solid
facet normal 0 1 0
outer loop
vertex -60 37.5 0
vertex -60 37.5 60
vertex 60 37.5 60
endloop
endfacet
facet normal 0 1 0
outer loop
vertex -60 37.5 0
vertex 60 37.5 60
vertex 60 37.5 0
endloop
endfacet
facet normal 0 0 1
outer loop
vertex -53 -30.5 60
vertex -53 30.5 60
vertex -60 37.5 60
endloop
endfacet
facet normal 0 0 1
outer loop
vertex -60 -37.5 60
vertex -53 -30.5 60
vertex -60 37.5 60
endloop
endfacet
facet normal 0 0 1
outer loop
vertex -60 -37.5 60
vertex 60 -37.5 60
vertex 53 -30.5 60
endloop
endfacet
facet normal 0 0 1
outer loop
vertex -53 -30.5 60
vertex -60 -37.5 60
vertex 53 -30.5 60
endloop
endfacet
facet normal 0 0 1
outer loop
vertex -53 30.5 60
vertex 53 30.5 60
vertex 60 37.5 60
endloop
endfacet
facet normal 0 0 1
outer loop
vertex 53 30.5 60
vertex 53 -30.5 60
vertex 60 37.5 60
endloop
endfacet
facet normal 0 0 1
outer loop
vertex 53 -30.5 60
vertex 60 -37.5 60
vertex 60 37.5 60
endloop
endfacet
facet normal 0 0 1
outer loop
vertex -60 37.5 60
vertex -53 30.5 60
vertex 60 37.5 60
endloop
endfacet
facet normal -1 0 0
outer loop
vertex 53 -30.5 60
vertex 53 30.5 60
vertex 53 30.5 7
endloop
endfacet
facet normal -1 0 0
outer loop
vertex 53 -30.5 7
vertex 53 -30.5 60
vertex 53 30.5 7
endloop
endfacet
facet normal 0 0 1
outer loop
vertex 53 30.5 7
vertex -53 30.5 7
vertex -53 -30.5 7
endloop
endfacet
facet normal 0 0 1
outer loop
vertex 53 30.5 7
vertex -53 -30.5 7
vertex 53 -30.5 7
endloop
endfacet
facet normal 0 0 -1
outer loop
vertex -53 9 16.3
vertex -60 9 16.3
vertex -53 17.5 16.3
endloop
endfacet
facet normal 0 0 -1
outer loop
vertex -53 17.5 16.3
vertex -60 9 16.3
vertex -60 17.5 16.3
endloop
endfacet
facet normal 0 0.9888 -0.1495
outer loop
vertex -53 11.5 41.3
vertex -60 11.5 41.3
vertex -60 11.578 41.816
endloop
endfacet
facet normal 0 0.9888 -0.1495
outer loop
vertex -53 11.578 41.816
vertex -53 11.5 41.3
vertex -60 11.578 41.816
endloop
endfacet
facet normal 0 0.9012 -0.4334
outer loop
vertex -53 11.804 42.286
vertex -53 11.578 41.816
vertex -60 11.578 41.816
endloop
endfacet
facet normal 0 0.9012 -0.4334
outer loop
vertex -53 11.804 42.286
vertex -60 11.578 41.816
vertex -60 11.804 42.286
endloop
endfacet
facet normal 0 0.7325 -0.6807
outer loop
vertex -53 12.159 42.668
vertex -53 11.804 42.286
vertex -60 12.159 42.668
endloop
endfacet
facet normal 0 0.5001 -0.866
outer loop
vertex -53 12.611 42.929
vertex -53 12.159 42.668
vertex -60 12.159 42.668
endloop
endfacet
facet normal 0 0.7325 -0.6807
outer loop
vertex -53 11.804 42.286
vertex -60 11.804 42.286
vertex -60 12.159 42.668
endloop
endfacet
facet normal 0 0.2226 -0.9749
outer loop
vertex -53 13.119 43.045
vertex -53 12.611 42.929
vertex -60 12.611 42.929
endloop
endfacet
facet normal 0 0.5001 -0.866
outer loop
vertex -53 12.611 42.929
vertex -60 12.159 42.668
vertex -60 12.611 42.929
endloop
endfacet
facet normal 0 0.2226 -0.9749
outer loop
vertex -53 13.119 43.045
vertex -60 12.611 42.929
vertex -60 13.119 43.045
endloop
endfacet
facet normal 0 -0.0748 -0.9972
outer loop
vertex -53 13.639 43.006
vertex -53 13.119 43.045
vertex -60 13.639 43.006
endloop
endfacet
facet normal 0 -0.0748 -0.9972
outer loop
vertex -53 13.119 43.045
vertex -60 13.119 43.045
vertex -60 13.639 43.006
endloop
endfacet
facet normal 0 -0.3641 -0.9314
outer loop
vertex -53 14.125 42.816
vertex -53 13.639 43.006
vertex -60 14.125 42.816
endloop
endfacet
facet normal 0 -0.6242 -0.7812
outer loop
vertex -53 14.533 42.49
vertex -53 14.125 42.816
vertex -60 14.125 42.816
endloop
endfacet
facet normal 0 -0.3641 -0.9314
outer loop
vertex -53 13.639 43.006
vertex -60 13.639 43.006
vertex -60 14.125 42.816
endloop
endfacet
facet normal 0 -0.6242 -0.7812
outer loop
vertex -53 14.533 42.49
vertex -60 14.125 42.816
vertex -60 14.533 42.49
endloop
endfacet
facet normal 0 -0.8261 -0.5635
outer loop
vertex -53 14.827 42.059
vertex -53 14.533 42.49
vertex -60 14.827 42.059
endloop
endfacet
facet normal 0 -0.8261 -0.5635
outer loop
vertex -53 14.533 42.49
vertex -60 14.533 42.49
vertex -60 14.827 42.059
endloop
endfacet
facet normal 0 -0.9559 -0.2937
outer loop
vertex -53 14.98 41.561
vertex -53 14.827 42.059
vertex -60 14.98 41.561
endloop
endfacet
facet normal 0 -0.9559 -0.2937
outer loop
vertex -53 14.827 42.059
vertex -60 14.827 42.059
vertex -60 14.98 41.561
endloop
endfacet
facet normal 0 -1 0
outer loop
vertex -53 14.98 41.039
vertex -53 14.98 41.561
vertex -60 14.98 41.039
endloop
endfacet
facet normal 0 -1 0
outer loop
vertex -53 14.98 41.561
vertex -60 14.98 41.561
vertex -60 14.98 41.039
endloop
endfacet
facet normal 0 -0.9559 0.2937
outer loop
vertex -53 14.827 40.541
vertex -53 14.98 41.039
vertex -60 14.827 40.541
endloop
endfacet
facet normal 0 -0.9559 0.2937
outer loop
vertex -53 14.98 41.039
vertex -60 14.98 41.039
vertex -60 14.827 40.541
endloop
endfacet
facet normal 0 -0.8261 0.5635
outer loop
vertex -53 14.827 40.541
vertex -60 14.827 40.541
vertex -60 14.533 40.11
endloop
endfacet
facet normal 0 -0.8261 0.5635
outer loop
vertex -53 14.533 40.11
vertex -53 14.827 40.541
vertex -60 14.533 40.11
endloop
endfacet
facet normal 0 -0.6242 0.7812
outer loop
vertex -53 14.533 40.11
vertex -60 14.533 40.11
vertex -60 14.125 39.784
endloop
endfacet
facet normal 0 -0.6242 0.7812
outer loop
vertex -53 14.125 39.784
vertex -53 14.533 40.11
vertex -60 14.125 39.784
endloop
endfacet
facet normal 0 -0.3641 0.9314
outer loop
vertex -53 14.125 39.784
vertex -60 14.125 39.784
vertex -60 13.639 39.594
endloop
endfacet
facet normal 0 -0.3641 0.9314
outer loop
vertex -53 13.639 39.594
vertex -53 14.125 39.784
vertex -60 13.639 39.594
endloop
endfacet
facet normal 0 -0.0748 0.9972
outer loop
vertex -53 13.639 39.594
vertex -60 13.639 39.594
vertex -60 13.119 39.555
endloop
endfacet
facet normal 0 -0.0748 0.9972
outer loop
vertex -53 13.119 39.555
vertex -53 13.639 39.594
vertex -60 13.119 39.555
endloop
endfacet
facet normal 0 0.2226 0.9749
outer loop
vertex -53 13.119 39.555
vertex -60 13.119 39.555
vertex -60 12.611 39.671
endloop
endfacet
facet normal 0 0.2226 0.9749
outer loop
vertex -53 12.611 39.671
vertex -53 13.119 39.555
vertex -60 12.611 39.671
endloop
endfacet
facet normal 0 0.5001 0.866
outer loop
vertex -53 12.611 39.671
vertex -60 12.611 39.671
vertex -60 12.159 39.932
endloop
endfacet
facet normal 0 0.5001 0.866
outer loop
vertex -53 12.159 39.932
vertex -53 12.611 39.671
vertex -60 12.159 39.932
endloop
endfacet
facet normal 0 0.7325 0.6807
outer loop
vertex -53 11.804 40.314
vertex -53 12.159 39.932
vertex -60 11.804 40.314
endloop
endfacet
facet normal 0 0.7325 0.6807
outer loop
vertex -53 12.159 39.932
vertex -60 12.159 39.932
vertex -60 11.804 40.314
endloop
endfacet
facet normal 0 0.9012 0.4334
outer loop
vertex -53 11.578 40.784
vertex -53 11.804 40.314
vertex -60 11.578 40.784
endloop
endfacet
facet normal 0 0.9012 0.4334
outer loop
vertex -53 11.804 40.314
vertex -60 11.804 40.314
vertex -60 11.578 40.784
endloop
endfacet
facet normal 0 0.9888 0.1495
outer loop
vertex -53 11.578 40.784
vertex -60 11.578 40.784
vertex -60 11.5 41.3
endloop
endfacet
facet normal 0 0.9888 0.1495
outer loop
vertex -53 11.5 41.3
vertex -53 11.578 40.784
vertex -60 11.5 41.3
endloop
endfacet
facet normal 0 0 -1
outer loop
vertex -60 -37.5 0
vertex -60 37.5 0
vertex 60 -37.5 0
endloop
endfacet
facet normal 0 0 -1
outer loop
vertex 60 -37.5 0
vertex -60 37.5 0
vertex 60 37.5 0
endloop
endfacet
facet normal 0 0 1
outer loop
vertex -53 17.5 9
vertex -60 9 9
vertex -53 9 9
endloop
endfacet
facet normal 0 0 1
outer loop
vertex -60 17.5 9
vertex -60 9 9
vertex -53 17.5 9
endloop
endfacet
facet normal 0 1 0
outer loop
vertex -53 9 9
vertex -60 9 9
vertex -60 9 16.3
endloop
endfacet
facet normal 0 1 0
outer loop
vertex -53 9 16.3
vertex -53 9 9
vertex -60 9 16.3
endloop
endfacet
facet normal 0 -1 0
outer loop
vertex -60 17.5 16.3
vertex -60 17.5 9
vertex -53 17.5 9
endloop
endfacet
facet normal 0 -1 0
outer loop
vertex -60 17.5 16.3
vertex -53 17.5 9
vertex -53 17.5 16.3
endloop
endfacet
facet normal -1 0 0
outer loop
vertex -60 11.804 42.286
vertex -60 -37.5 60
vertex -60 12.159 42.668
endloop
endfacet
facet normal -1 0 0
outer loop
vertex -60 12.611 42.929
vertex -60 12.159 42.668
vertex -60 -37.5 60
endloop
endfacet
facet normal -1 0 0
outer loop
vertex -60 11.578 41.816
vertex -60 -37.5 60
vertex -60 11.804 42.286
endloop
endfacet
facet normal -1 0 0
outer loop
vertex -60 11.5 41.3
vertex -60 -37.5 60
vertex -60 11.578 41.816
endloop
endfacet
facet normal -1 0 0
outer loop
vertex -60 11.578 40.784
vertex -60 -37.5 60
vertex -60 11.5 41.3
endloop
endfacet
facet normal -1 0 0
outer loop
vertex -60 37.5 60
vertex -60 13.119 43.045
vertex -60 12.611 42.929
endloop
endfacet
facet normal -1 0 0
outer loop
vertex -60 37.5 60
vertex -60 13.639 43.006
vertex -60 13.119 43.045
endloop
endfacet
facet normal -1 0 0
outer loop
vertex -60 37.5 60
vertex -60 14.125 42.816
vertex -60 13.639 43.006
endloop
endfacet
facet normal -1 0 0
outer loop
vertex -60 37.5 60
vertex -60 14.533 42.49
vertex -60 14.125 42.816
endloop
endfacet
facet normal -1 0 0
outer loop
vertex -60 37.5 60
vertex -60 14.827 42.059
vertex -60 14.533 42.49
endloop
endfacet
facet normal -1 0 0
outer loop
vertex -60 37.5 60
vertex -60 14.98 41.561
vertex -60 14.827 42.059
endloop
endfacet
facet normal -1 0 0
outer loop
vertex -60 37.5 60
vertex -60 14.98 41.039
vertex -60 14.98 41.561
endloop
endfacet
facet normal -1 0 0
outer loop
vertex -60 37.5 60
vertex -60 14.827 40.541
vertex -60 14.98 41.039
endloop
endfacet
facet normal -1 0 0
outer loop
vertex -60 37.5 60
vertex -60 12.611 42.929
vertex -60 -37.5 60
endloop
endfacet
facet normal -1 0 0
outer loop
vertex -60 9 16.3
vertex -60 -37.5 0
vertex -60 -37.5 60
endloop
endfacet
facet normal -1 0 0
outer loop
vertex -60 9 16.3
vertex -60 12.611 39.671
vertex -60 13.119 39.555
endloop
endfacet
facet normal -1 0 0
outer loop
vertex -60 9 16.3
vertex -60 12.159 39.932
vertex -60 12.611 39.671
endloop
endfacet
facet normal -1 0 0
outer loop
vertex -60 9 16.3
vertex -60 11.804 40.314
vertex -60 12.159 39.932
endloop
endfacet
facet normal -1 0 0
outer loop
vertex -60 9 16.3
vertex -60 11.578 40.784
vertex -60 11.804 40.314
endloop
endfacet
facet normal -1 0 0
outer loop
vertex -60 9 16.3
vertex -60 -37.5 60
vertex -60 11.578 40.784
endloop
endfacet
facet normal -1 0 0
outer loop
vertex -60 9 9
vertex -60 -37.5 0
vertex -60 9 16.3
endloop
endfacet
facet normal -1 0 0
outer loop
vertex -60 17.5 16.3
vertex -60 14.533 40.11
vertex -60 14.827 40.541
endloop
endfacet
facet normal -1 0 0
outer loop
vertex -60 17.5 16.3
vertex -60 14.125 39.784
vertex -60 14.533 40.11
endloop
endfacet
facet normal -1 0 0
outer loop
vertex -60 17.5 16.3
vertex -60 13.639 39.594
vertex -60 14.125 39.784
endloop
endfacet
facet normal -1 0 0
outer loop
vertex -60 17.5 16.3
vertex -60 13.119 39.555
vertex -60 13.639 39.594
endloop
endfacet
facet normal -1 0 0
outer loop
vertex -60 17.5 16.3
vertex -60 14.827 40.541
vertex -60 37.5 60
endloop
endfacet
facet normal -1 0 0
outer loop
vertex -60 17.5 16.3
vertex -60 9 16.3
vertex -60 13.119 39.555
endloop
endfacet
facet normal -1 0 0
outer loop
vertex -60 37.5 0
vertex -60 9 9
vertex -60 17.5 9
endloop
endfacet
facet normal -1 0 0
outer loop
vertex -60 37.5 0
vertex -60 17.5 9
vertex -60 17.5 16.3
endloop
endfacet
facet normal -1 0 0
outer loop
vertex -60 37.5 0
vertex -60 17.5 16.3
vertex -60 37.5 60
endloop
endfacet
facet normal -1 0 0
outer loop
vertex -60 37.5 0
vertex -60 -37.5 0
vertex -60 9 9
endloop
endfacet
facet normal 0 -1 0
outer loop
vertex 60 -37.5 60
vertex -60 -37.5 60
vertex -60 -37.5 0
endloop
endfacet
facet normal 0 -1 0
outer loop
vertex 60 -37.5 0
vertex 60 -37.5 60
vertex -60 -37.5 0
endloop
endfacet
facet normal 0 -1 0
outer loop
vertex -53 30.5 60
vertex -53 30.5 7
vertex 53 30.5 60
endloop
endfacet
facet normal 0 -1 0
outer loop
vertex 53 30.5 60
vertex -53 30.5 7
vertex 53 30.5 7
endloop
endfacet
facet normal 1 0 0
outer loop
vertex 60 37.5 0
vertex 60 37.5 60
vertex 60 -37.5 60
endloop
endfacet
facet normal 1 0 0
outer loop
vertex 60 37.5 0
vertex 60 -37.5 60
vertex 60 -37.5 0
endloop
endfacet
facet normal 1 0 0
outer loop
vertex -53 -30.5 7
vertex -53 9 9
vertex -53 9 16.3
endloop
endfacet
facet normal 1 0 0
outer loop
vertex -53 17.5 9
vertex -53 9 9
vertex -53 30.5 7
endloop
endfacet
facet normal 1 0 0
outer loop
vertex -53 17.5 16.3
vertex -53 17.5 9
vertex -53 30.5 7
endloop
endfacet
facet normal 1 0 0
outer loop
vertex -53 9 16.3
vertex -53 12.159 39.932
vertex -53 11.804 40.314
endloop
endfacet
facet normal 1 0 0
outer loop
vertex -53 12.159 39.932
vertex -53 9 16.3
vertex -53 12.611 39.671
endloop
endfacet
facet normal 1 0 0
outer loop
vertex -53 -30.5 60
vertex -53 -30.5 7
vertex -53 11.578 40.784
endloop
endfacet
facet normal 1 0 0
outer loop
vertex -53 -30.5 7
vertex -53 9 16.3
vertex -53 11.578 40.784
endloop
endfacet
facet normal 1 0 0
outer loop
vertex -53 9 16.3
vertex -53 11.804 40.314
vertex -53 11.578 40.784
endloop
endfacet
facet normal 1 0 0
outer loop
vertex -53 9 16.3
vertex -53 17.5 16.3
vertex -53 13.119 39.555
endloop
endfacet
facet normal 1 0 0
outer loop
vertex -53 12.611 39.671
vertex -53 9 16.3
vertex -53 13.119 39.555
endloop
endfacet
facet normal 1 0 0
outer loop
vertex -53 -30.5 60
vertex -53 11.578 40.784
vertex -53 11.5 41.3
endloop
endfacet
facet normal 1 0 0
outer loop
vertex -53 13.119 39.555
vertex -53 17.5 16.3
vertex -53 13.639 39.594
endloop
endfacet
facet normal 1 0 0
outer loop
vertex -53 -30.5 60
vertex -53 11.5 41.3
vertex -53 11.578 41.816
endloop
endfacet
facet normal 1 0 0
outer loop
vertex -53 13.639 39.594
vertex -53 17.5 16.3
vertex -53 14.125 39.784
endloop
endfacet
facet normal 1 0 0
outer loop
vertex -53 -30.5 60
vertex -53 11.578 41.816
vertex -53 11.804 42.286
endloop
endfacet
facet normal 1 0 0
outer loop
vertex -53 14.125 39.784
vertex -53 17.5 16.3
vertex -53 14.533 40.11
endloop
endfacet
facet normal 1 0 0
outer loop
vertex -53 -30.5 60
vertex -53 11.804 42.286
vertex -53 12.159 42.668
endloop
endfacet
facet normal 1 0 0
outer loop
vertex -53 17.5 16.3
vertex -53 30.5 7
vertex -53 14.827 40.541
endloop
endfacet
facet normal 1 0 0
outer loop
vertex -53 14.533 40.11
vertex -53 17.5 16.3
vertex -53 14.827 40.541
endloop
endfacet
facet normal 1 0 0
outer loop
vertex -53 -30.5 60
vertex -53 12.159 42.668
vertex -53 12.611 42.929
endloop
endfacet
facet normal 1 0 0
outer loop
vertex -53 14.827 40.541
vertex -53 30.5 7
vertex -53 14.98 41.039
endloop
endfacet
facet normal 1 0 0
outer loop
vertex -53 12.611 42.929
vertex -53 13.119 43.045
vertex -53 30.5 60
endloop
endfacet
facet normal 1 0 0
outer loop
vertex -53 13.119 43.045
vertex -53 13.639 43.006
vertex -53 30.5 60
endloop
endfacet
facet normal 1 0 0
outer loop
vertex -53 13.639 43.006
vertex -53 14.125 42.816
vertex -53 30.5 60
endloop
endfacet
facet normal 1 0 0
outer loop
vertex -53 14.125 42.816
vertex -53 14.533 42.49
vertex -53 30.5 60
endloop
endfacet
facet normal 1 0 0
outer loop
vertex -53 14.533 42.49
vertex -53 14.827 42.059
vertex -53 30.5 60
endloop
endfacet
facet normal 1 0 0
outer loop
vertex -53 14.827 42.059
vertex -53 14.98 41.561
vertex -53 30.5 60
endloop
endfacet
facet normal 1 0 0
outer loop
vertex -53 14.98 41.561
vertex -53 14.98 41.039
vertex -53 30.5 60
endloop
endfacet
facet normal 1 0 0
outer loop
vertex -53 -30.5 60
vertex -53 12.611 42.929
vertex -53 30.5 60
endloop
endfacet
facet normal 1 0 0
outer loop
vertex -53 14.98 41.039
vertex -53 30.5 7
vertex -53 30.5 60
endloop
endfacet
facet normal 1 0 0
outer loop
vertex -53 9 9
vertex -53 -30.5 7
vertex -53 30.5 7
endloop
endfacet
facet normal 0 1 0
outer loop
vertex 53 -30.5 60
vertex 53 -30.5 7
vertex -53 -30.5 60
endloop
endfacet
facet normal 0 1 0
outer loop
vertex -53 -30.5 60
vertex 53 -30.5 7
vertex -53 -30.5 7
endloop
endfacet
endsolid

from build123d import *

# Parameters (mm, degrees)
SKICA1_W                 = 120
SKICA1_H                 = 75
P_IDAT_VYSUNUT_M9_DEPTH  = 7
SKICA9_W                 = 60
SKICA9_H                 = 75
P_IDAT_VYSUNUT_M10_DEPTH = 7
SKICA10_W                = 60
SKICA10_H                = 75
P_IDAT_VYSUNUT_M11_DEPTH = 7
SKICA11_W                = 120
SKICA11_H                = 60
P_IDAT_VYSUNUT_M12_DEPTH = 7
SKICA12_W                = 120
SKICA12_H                = 60
P_IDAT_VYSUNUT_M13_DEPTH = 7
SKICA13_R                = 1.75
SKICA13_W                = 7.3
SKICA13_H                = 8.5
ODEBRAT_VYSUNUT_M1_DEPTH = 7


with BuildPart() as part:
    # Skica1 → Přidat vysunutím9 (new body)
    with BuildSketch(Plane.XY):
        Rectangle(SKICA1_W, SKICA1_H)
    extrude(amount=P_IDAT_VYSUNUT_M9_DEPTH)

    # Skica9 → Přidat vysunutím10 (add)
    with BuildSketch(Plane.ZY.offset(60)):
        with Locations((30, 0)):
            Rectangle(SKICA9_W, SKICA9_H)
    extrude(amount=-P_IDAT_VYSUNUT_M10_DEPTH)

    # Skica10 → Přidat vysunutím11 (add)
    with BuildSketch(Plane(origin=(60, 0, 0), x_dir=(0, 0, -1), z_dir=(1, 0, 0))):
        with Locations((-30, 0)):
            Rectangle(SKICA10_W, SKICA10_H)
    extrude(amount=-P_IDAT_VYSUNUT_M11_DEPTH)

    # Skica11 → Přidat vysunutím12 (add)
    with BuildSketch(Plane(origin=(0, -37.5, 0), x_dir=(-1, 0, 0), z_dir=(0, -1, 0))):
        with Locations((0, -30)):
            Rectangle(SKICA11_W, SKICA11_H)
    extrude(amount=-P_IDAT_VYSUNUT_M12_DEPTH)

    # Skica12 → Přidat vysunutím13 (add)
    with BuildSketch(Plane(origin=(0, 37.5, 0), x_dir=(1, 0, 0), z_dir=(0, 1, 0))):
        with Locations((0, -30)):
            Rectangle(SKICA12_W, SKICA12_H)
    extrude(amount=-P_IDAT_VYSUNUT_M13_DEPTH)

    # Skica13 → Odebrat vysunutím1 (cut)
    with BuildSketch(Plane.ZY.offset(60)):
        with Locations(Location((41.3, 13.25, 0), (0, 0, 270))):
            Circle(SKICA13_R)
        with Locations((12.65, 13.25)):
            Rectangle(SKICA13_W, SKICA13_H)
    extrude(amount=-ODEBRAT_VYSUNUT_M1_DEPTH, mode=Mode.SUBTRACT)


solid = part.part
